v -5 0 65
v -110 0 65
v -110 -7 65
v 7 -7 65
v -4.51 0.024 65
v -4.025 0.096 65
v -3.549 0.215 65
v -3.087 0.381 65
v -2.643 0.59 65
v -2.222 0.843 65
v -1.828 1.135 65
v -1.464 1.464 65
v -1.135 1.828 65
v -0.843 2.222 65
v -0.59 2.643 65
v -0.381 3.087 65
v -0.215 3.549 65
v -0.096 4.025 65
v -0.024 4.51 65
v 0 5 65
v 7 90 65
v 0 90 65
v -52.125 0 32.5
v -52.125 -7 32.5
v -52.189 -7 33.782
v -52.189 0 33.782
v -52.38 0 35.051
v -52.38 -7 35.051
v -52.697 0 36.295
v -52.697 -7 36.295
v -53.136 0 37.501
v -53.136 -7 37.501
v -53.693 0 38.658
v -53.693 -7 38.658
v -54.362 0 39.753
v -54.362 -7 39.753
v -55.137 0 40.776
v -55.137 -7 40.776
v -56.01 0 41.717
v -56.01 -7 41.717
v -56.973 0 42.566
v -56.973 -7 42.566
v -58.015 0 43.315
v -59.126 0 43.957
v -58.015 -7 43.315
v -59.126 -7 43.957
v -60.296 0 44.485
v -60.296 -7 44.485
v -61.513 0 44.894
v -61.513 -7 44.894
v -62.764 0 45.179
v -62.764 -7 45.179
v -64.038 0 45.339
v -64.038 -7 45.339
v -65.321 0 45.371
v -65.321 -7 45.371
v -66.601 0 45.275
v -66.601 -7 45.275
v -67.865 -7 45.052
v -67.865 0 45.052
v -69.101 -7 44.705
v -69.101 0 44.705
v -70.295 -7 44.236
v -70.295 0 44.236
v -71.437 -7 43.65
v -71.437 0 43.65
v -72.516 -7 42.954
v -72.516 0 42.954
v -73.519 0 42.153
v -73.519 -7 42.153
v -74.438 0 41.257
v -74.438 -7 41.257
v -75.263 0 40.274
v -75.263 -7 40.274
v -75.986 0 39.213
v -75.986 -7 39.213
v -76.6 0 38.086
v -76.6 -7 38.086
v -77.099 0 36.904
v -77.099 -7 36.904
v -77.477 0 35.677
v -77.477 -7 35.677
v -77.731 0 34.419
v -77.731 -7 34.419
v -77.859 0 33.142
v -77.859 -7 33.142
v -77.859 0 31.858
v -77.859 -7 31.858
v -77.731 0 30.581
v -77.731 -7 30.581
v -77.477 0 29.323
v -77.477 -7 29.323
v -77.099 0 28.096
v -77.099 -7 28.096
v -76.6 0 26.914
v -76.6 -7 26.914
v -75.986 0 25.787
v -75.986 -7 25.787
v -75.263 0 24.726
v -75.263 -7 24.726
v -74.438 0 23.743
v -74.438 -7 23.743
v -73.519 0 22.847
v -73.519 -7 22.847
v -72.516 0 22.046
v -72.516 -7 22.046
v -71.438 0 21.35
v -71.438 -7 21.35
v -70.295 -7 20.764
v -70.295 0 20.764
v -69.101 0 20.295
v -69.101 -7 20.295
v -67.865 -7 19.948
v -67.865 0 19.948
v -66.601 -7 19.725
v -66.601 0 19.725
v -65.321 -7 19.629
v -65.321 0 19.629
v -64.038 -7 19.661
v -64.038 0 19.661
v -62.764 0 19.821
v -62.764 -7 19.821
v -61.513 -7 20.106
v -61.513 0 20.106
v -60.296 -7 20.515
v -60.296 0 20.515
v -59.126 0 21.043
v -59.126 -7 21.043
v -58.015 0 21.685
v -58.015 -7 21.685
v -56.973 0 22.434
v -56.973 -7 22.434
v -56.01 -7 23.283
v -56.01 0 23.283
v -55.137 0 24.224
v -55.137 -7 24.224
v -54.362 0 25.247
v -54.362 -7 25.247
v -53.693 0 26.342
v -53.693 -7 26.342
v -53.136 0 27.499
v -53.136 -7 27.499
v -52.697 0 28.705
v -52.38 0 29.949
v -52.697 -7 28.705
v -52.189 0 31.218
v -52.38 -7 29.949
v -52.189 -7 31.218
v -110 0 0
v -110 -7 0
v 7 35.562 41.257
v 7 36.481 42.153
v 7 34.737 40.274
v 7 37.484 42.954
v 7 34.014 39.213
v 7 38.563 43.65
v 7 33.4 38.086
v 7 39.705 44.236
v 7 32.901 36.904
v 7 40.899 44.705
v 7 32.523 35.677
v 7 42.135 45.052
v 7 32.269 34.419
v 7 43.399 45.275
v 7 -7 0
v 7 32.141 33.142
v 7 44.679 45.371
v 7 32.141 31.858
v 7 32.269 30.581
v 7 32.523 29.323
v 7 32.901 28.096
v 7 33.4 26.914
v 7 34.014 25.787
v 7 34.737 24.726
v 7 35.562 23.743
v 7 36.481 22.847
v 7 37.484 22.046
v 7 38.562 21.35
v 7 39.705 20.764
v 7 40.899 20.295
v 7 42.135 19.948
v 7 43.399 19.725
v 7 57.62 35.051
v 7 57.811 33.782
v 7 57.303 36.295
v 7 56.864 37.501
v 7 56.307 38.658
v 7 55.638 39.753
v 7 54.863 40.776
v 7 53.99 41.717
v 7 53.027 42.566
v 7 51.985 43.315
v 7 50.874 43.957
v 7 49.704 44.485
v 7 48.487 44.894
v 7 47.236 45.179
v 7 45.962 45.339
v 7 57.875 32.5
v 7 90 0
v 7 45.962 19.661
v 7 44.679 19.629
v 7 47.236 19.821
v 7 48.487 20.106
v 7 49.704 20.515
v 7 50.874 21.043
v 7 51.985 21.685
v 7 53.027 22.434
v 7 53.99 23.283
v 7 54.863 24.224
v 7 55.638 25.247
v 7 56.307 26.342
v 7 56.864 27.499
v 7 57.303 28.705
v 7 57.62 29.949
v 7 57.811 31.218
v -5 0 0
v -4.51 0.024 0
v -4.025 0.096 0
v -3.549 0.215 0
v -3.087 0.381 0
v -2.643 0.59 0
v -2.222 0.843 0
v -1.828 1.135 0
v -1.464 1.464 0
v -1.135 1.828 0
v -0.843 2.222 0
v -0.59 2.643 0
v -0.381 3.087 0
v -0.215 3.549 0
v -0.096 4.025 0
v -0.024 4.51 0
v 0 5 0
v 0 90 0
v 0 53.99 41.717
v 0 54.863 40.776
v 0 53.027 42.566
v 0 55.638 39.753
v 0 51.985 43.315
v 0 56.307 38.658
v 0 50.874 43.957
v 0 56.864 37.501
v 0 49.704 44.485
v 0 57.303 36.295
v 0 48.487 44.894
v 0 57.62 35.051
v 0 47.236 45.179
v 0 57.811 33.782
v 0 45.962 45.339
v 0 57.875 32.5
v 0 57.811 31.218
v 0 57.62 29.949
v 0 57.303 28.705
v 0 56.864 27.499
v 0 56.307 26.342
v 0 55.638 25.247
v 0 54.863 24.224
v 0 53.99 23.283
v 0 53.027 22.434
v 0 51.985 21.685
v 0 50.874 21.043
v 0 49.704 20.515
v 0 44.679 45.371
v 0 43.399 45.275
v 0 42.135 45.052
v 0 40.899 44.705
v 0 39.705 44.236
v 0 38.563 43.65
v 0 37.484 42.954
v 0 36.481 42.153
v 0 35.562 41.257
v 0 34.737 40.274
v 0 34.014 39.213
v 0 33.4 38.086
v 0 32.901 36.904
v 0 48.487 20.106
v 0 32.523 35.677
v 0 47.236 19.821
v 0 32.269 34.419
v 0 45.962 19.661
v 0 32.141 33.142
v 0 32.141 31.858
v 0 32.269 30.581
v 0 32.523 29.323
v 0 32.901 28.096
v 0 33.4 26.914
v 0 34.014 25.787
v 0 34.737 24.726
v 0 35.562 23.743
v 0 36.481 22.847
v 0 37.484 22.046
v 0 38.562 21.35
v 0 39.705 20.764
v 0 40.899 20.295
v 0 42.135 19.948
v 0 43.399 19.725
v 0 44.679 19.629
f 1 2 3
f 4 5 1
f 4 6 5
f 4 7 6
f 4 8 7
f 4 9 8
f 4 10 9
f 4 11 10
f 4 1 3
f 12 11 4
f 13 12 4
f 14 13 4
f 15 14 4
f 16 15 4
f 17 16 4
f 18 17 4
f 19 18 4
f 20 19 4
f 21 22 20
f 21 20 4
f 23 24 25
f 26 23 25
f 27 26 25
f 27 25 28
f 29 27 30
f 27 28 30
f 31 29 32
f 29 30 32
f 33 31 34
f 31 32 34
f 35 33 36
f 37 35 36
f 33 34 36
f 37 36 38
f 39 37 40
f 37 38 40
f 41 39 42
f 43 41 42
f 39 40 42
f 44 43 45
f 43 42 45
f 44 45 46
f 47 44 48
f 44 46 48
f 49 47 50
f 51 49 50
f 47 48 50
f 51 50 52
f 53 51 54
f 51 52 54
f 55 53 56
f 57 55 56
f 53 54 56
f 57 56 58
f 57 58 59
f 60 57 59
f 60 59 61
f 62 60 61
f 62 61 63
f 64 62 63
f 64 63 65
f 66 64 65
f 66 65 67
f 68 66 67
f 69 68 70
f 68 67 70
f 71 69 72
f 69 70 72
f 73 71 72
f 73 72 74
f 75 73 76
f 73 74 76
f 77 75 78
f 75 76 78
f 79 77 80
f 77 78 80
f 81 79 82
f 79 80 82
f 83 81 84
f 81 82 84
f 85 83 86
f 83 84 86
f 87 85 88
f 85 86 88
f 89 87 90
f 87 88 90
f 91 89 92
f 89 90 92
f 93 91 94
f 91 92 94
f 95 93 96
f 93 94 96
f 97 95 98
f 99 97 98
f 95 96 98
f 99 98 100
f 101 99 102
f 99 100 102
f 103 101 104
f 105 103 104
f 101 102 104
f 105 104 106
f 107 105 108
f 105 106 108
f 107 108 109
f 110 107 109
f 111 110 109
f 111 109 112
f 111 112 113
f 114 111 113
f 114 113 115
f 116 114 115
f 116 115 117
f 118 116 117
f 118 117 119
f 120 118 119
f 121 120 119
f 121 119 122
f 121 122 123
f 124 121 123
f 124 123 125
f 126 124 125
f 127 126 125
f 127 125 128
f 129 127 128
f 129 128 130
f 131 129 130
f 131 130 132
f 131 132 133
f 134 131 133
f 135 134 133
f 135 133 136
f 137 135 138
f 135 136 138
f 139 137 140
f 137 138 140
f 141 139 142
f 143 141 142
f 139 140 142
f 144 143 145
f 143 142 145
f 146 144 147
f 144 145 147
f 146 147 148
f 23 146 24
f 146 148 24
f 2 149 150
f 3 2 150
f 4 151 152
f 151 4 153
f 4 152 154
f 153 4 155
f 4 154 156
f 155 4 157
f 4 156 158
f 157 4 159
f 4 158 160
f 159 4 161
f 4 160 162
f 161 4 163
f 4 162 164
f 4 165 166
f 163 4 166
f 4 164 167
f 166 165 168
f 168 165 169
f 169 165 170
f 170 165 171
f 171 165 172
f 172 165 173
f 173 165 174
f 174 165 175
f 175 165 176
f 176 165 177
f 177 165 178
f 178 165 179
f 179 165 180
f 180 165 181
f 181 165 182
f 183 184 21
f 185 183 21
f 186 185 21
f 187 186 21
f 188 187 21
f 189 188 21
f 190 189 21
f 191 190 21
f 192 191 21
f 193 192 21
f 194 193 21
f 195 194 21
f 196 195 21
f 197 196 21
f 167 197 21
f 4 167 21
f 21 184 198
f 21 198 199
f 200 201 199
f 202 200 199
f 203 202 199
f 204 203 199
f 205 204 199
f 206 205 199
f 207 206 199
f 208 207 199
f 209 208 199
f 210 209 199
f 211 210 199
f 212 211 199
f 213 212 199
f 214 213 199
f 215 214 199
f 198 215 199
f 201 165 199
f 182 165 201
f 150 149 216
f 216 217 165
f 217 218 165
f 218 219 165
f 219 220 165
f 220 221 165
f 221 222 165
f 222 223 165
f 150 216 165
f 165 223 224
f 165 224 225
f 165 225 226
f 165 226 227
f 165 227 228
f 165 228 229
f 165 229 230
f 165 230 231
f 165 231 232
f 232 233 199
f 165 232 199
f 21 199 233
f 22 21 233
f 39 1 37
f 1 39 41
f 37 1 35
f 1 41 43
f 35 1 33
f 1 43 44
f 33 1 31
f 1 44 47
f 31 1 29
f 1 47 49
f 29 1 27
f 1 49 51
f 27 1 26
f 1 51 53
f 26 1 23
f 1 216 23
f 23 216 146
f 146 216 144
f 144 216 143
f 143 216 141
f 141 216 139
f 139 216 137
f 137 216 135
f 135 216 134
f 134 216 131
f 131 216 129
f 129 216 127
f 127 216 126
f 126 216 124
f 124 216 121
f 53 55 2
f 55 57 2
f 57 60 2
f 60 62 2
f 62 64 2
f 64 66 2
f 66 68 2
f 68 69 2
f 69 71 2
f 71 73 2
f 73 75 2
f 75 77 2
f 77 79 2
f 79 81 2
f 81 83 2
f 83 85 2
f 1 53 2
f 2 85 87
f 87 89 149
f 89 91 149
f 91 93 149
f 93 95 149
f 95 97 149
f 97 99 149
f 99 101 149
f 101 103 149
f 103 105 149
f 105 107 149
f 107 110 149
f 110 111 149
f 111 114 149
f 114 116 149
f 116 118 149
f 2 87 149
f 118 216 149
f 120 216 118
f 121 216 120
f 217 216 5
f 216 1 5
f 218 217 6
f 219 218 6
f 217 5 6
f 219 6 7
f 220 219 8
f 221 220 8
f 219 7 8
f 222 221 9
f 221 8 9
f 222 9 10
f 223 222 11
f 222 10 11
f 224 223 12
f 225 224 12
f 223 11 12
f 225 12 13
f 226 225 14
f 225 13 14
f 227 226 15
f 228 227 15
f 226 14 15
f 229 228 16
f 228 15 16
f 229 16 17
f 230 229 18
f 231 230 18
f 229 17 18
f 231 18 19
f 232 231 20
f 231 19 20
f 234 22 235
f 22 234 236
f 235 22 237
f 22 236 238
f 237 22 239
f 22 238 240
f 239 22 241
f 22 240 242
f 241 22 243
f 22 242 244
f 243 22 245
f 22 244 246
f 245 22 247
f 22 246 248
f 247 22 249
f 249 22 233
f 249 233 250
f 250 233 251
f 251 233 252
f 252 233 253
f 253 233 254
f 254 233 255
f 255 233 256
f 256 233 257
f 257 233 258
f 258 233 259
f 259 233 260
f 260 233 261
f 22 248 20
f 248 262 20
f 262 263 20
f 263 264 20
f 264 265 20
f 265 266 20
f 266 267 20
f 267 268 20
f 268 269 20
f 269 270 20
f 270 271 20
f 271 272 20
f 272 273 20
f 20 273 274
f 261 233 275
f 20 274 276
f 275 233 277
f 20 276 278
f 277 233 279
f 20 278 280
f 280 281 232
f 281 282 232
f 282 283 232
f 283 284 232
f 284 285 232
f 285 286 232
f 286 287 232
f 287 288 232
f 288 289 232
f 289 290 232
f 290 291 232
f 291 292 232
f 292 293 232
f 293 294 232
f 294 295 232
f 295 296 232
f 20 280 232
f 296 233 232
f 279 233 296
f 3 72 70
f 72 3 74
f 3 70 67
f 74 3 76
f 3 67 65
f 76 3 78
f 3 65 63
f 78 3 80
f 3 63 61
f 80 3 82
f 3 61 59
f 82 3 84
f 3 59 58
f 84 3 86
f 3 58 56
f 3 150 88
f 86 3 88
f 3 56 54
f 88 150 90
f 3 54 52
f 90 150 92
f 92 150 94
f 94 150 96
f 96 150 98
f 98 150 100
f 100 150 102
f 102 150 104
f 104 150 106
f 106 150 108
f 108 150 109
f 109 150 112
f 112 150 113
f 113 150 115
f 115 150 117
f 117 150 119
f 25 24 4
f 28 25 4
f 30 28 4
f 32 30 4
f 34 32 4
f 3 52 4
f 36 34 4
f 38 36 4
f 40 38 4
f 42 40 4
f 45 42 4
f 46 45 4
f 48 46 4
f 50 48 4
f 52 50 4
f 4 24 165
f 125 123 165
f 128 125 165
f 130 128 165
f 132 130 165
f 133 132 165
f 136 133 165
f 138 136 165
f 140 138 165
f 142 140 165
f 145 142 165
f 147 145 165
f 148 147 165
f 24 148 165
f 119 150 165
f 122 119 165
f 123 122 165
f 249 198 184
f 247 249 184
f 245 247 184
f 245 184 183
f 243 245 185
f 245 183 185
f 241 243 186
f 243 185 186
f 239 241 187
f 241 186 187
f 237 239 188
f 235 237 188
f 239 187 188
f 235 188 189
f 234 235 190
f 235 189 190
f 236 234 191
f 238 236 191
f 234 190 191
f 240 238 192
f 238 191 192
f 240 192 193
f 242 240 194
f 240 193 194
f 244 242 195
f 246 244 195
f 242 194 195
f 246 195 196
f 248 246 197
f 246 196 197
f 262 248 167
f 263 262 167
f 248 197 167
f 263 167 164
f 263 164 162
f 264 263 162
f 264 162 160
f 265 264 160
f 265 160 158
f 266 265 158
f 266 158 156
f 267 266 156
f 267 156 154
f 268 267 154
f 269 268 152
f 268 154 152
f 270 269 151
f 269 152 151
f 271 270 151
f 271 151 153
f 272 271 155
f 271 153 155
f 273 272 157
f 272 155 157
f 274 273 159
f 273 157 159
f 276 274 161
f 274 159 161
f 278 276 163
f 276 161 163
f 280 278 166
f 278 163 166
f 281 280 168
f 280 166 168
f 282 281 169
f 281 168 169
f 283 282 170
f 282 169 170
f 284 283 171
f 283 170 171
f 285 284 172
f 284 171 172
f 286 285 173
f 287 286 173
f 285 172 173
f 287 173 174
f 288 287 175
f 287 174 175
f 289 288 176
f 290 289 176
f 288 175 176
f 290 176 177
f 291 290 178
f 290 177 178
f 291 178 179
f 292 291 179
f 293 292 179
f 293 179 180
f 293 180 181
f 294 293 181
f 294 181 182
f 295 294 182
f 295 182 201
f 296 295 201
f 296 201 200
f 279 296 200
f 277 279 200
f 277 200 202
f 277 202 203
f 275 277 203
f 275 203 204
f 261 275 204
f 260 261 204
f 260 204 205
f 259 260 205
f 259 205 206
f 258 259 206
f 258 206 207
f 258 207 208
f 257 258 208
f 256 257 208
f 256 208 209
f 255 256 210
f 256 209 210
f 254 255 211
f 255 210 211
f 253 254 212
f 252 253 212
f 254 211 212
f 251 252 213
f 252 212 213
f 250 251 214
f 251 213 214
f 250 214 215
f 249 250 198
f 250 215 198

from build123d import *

# Parameters (mm, degrees)
F1_DEPTH = 65
F2_R     = 5
F3_R     = 12.875
F4_DEPTH = 7
F5_R     = 12.875
F6_DEPTH = 7


with BuildPart() as f1:
    # F0 (on Top) → F1 (new body)
    with BuildSketch(Plane.XY):
        Polygon((0, 0), (-110, 0), (-110, -7), (7, -7), (7, 90), (0, 90), align=None)
    extrude(amount=F1_DEPTH)

    # F2
    f2_edges = [f1.edges().sort_by_distance(p)[0] for p in [
        (0, 0, 32.5),
    ]]
    fillet(f2_edges, radius=F2_R)

    # F3 (on face) → F4 (cut)
    with BuildSketch(Plane.YZ.offset(7)):
        with Locations((45, 32.5)):
            Circle(F3_R)
    extrude(amount=-F4_DEPTH, mode=Mode.SUBTRACT)

    # F5 (on face) → F6 (cut)
    with BuildSketch(Plane.XZ.offset(7)):
        with Locations((-65, 32.5)):
            Circle(F5_R)
    extrude(amount=-F6_DEPTH, mode=Mode.SUBTRACT)


solid = f1.part
